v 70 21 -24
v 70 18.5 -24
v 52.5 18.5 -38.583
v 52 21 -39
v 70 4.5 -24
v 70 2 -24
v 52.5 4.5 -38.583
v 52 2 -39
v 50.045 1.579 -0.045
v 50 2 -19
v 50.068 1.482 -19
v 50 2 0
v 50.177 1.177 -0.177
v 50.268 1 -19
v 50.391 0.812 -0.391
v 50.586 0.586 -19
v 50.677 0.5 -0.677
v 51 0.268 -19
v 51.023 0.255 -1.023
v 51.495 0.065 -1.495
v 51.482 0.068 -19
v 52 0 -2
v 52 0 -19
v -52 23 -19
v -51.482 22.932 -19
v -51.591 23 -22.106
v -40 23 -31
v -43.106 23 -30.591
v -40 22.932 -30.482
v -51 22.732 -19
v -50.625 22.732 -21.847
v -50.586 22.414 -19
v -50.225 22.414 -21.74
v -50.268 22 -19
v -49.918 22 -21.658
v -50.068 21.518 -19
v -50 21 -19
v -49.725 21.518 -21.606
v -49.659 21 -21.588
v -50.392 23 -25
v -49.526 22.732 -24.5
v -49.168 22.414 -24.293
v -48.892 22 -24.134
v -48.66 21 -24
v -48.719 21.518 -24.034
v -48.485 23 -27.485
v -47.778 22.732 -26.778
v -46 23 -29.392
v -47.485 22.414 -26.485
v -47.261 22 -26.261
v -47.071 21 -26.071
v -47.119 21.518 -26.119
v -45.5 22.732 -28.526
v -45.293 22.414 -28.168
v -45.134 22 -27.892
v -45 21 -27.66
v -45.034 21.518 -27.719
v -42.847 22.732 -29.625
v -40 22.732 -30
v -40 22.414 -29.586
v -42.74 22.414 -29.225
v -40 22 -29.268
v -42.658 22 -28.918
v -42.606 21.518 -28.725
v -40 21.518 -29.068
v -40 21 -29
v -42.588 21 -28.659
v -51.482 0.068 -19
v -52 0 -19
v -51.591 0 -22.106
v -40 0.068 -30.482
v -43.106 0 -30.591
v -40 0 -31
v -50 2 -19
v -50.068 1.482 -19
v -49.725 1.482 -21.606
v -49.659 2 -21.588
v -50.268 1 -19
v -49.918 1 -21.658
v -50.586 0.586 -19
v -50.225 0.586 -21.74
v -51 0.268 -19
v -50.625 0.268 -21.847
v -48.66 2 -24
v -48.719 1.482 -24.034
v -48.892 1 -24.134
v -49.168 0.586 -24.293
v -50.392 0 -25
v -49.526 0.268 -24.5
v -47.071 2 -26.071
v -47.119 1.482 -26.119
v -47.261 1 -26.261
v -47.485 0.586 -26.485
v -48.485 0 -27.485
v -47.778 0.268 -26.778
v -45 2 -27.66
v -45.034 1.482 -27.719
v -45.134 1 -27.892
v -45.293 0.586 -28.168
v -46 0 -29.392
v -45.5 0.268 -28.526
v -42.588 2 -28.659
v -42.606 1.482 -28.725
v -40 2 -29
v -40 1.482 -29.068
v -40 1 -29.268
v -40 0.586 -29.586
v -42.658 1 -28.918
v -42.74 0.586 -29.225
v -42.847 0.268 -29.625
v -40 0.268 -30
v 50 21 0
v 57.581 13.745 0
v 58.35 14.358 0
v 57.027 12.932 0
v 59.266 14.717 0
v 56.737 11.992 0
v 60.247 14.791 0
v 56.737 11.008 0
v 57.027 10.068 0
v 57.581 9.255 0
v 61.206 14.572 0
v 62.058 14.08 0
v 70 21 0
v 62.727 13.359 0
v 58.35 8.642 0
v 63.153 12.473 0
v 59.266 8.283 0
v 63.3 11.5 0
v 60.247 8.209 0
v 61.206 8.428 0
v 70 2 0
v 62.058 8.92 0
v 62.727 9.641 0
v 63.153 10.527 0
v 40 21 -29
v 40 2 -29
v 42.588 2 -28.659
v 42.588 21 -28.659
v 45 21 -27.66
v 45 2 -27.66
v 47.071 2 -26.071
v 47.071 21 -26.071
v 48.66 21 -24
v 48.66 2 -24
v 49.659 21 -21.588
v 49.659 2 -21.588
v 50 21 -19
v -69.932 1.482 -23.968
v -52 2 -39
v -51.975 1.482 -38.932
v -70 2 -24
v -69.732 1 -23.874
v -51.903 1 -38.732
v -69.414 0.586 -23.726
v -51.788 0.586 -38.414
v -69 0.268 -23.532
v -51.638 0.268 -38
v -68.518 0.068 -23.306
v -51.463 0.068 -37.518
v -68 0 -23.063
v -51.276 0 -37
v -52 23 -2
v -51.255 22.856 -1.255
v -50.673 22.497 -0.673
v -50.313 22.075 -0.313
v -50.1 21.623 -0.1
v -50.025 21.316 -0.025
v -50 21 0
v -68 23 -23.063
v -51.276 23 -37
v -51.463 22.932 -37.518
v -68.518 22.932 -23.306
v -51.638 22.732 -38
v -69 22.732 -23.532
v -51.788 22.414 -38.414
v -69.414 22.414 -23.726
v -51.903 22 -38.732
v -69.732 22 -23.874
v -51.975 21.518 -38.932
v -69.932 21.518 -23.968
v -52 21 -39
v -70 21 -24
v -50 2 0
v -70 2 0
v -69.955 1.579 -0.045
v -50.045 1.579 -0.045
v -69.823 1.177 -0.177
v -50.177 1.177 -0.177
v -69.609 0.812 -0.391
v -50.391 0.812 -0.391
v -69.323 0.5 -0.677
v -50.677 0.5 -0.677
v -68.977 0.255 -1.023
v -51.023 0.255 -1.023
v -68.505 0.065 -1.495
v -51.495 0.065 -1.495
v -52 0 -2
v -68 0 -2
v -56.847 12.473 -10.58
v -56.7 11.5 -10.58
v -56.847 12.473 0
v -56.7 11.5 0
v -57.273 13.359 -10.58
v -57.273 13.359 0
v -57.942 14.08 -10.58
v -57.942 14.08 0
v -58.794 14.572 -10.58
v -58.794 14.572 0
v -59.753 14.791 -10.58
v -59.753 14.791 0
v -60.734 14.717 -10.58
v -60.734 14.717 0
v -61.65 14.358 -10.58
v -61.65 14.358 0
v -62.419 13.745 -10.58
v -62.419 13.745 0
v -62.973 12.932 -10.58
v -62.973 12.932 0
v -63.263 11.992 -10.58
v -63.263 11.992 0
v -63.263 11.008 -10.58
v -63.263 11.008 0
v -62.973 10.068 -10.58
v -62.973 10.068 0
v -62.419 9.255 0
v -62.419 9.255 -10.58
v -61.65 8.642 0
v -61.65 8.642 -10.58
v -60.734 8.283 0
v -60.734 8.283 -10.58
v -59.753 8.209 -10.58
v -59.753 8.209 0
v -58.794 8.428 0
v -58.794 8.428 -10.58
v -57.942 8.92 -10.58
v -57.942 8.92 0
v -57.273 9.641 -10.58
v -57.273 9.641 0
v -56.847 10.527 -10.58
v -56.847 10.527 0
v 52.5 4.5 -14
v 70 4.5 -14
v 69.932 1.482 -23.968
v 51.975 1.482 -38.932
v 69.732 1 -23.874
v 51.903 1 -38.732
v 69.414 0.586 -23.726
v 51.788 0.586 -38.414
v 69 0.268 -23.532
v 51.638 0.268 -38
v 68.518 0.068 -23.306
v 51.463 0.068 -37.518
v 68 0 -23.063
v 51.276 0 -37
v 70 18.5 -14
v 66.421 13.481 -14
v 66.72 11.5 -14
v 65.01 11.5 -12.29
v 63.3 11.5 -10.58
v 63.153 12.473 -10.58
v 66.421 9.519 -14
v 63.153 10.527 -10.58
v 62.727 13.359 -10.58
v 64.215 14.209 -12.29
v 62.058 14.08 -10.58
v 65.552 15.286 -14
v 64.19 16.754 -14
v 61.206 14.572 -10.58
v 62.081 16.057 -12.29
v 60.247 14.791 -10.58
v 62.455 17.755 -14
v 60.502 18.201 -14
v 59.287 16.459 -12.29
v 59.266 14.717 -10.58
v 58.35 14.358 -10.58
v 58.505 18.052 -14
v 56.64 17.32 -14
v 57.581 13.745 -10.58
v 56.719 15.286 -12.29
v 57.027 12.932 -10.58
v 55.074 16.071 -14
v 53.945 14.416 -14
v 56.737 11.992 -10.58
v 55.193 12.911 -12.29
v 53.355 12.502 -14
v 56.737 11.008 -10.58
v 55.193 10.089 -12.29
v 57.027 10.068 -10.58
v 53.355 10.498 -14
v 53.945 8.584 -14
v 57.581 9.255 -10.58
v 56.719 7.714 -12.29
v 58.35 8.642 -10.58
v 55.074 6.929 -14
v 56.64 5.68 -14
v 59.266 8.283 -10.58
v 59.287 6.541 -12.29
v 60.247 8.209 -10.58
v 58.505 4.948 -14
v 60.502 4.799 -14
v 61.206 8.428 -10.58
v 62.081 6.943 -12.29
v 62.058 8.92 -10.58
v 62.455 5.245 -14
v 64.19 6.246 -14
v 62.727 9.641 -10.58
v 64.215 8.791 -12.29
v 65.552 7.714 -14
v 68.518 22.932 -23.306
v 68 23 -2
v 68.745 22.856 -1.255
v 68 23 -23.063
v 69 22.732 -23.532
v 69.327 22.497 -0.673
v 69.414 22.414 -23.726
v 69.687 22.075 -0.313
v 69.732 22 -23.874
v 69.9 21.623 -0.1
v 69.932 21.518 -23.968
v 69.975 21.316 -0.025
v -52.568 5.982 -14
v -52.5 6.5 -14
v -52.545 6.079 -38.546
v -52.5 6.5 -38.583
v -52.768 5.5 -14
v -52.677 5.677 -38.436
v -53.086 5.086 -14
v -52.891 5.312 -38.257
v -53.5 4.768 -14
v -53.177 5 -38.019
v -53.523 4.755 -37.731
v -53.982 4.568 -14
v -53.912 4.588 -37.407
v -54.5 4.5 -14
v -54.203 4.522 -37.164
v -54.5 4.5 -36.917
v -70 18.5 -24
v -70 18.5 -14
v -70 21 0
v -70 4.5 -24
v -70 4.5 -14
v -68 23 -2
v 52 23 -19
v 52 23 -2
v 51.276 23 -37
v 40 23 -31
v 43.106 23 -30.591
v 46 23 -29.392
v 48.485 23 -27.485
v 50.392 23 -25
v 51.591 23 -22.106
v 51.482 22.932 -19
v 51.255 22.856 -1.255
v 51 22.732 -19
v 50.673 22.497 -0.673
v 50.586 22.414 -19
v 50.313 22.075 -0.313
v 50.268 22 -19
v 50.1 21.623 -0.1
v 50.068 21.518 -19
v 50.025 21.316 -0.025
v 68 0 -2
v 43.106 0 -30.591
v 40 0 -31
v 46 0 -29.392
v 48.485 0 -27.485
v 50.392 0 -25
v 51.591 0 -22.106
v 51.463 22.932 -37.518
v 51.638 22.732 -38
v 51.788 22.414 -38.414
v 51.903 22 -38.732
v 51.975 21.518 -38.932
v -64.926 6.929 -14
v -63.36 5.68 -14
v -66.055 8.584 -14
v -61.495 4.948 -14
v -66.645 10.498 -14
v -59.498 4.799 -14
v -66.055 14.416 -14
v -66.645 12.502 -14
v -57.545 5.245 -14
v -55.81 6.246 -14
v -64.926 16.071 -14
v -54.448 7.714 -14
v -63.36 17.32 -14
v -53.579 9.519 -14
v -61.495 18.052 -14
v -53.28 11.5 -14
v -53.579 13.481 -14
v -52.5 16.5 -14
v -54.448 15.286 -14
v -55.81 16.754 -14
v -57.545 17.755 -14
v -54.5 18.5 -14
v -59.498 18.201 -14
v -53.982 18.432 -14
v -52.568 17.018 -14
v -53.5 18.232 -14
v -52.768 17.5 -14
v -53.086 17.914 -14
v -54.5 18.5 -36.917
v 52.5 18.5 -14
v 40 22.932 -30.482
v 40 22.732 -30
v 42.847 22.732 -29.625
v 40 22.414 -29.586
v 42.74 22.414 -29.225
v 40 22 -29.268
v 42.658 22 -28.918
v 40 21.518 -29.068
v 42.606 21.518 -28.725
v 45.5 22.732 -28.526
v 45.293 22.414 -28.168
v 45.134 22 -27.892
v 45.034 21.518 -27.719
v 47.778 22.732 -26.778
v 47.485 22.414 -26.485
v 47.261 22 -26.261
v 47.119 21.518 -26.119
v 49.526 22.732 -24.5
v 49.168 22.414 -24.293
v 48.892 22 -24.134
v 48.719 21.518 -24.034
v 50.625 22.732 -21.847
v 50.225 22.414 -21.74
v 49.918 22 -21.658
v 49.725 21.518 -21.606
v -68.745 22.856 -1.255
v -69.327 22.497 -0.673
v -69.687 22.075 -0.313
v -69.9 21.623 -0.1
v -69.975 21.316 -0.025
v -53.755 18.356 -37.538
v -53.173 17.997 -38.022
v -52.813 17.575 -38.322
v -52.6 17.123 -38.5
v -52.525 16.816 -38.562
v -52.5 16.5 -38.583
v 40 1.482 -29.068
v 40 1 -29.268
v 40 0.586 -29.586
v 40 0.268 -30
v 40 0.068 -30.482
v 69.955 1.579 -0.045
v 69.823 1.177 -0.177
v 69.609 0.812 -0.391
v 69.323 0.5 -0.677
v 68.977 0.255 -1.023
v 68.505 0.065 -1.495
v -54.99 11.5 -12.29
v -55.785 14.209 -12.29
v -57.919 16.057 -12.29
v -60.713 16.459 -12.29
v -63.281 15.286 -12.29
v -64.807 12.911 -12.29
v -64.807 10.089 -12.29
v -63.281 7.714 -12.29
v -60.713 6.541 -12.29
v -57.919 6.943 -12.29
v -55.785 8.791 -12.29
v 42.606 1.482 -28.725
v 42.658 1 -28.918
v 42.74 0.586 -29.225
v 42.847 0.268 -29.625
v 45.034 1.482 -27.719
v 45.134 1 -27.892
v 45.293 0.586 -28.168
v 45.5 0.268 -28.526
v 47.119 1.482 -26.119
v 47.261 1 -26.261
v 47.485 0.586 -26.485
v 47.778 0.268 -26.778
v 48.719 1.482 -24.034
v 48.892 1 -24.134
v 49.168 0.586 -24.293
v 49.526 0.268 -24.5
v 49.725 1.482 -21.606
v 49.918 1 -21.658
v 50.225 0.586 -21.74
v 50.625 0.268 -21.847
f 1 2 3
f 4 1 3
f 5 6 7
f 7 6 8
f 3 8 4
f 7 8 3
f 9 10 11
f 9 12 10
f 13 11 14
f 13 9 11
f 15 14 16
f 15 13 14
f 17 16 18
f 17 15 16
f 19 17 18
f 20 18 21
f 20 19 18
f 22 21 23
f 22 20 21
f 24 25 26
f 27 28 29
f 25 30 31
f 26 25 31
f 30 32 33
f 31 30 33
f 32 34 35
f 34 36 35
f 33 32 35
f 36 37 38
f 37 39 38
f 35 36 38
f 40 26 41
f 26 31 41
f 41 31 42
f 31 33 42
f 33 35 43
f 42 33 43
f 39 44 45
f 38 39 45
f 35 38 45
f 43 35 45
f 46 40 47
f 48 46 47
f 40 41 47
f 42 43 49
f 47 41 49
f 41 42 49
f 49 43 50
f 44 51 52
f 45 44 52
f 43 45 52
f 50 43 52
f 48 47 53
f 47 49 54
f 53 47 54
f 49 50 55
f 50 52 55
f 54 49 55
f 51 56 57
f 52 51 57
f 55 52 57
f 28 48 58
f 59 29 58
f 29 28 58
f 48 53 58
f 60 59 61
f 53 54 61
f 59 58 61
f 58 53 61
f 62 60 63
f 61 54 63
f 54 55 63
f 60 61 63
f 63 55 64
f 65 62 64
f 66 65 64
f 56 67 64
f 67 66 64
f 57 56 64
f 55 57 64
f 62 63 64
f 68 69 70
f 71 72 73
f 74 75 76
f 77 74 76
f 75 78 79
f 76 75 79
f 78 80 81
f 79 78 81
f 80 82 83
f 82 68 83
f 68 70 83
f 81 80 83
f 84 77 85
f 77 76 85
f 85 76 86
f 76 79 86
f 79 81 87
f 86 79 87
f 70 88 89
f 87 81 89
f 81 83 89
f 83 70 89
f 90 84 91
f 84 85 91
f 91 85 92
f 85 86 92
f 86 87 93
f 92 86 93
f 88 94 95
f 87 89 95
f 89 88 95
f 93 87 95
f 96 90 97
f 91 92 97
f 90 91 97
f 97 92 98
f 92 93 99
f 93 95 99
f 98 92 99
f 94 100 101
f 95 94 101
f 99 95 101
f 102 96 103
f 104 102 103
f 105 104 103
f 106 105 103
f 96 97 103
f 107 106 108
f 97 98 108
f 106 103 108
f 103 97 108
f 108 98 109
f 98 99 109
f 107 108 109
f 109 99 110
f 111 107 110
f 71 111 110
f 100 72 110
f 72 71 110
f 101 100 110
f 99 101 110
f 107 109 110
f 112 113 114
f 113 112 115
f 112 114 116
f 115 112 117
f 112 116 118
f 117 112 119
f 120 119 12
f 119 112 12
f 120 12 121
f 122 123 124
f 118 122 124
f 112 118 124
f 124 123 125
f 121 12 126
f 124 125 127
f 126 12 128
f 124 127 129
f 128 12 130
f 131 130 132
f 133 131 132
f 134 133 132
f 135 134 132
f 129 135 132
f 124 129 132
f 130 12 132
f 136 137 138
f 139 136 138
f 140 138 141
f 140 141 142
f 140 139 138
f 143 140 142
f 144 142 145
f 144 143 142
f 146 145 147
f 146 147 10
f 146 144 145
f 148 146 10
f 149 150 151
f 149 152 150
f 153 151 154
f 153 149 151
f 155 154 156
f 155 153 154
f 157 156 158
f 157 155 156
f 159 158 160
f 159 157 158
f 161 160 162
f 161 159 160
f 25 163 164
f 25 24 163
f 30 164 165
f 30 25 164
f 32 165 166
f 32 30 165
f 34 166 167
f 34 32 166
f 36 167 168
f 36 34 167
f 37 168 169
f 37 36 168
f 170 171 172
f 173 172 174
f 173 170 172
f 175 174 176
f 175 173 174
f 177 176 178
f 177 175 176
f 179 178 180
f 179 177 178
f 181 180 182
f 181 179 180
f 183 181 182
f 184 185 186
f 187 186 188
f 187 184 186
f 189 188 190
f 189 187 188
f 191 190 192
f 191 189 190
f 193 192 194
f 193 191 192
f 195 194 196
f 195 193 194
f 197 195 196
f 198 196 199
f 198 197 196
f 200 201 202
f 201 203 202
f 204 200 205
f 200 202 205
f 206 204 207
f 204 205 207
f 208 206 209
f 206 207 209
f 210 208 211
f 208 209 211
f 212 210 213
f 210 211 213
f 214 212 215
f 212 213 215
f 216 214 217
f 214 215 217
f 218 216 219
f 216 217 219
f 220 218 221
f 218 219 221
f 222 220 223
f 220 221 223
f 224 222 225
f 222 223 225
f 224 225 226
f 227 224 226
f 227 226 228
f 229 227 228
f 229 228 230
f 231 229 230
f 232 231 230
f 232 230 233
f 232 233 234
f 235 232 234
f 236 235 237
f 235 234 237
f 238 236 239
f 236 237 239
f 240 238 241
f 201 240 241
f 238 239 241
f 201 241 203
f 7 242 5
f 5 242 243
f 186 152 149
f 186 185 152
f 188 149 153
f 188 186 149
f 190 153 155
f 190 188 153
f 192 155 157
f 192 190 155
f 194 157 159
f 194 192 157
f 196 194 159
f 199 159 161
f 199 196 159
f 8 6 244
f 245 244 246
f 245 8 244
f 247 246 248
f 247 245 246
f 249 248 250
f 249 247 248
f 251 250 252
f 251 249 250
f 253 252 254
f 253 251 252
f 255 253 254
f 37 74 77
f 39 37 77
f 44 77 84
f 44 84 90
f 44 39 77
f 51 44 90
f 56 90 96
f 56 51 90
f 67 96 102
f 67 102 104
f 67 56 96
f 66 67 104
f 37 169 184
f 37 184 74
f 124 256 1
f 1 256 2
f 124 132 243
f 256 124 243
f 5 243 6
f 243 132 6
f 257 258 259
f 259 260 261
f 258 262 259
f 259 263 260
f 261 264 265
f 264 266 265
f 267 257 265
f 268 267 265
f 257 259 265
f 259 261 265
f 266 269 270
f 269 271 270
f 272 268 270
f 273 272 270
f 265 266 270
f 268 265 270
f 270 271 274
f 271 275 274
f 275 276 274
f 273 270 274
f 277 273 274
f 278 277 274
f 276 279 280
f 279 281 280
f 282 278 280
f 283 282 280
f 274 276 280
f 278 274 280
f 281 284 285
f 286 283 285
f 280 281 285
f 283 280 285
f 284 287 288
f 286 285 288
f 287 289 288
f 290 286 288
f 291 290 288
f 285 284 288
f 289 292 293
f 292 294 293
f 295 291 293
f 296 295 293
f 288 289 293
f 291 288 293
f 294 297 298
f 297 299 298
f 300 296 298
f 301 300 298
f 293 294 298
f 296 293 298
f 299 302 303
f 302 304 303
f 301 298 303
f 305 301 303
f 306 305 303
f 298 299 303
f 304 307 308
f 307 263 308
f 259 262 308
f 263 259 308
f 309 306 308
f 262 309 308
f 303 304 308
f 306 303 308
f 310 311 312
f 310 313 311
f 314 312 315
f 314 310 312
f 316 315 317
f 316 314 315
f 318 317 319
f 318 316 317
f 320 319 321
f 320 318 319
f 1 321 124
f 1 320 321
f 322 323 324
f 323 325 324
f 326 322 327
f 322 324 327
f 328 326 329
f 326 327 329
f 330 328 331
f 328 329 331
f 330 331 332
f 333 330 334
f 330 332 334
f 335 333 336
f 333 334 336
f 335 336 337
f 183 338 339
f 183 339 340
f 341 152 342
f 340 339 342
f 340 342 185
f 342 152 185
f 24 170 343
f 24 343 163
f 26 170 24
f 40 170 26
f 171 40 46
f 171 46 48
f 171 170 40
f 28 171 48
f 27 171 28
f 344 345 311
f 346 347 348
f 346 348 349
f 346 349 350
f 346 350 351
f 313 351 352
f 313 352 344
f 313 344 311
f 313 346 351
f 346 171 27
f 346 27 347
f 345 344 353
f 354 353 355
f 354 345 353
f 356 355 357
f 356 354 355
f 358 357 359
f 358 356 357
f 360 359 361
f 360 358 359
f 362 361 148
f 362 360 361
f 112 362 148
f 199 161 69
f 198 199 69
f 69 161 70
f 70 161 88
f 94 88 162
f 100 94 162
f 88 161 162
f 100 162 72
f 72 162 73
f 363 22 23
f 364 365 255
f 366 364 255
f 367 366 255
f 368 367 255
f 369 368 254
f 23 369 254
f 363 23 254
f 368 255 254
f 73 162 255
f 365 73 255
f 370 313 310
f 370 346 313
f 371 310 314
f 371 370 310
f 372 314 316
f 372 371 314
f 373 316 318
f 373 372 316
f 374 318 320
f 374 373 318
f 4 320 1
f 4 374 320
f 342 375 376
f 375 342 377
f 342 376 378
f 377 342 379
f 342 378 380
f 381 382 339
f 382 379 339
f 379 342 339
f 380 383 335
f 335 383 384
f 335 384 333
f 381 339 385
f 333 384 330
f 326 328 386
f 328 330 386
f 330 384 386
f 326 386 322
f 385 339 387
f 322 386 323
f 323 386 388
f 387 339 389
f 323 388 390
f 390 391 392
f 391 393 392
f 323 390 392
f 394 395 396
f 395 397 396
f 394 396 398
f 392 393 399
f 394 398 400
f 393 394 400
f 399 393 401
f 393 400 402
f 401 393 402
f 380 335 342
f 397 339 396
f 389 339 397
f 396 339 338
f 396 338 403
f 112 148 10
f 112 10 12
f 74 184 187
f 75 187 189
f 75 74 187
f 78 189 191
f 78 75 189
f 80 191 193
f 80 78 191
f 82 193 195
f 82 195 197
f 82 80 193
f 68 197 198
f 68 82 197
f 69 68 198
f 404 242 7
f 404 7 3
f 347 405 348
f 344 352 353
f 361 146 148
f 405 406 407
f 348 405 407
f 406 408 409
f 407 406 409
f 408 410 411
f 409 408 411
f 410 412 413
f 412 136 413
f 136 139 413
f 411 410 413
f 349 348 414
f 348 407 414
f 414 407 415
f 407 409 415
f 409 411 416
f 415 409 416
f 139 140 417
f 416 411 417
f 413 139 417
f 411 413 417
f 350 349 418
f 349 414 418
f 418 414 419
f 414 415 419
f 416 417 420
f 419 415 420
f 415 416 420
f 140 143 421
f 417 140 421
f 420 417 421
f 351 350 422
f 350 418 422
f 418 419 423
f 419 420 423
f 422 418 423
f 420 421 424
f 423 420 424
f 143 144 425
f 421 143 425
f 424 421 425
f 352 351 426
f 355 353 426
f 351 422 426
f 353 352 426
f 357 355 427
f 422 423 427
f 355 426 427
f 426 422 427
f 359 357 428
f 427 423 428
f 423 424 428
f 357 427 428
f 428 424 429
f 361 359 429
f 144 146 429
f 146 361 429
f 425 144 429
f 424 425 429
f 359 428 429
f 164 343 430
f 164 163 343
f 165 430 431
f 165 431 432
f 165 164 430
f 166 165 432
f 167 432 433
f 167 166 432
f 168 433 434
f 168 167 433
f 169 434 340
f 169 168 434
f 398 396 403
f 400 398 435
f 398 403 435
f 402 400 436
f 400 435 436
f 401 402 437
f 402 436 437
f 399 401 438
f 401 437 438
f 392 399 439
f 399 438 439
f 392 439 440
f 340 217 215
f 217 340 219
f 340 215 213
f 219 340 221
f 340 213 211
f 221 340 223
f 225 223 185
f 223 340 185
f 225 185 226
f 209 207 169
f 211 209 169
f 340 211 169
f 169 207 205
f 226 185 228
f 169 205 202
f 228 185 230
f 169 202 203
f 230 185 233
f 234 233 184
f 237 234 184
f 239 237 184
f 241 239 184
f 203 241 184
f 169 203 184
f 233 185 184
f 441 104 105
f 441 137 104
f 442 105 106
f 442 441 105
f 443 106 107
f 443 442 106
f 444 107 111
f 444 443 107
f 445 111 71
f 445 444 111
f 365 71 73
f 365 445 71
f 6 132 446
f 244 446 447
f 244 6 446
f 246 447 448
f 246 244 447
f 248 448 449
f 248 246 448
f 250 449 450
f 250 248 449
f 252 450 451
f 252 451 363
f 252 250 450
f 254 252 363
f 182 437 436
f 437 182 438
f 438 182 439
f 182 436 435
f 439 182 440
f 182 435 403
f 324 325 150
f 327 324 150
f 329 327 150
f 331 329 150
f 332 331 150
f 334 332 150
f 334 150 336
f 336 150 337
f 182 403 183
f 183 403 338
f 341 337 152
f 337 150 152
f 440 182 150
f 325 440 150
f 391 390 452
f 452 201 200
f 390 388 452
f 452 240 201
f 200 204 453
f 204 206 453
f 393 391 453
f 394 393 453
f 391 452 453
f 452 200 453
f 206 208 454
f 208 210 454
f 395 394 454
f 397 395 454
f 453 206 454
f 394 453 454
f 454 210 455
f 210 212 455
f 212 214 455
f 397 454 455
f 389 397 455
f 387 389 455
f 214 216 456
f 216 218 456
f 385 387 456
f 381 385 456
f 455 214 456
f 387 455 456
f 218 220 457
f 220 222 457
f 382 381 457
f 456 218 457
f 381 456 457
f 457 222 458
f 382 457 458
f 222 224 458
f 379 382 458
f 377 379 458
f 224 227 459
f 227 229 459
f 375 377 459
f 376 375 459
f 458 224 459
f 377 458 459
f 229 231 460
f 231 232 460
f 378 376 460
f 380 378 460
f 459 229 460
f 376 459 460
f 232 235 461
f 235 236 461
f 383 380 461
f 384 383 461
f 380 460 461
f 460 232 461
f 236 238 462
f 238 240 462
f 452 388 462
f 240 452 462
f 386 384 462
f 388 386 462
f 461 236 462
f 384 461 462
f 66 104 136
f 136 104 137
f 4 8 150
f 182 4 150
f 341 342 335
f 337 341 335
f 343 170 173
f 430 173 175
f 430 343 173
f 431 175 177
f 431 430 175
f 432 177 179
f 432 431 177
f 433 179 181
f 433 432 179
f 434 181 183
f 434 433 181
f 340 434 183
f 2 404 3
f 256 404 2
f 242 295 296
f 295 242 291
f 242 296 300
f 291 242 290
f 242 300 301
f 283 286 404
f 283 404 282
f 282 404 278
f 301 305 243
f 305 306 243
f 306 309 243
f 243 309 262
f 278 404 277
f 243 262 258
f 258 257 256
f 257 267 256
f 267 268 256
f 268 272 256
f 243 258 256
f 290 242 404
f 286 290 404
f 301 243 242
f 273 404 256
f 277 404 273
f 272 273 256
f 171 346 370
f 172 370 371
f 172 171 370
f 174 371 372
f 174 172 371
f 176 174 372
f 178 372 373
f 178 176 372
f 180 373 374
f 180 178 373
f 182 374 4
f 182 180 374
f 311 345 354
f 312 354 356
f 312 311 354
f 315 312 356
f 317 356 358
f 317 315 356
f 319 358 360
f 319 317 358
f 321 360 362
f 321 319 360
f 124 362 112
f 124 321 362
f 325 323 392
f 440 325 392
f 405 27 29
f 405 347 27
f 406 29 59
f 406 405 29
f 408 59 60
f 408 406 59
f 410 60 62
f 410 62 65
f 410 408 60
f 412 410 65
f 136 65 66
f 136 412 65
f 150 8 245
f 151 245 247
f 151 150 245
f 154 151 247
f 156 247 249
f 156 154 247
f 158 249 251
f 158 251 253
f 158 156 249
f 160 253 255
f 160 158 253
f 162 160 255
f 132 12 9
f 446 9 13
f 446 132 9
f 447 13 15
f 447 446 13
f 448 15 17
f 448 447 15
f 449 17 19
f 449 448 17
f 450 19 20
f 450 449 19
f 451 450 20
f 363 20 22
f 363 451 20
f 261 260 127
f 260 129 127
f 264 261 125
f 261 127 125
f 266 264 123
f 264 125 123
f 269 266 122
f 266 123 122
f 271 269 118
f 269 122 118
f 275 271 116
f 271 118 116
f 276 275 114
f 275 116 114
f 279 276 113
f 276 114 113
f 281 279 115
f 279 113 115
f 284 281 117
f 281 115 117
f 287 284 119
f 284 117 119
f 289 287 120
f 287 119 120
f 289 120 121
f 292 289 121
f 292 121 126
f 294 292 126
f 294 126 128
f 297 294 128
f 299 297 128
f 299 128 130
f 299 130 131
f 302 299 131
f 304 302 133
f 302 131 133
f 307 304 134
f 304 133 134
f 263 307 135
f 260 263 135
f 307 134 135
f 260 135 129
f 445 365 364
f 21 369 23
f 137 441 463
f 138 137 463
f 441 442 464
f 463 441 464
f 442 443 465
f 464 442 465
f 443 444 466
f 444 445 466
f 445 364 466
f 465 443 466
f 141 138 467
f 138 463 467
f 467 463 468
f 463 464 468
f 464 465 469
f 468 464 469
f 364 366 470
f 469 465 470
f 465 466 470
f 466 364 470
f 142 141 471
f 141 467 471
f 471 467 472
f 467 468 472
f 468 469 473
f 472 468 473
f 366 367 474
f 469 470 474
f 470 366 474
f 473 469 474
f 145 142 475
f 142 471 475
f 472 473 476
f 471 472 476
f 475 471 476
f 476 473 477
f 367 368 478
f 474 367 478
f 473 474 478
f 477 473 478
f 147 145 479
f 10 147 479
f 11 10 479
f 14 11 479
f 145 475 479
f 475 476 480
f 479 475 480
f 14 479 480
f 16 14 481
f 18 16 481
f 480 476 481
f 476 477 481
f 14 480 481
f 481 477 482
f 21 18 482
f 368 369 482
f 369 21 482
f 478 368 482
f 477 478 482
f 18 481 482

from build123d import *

# Parameters (mm, degrees)
EXTRUDE_1_DEPTH              = 23
CUT_EXTRUDE_1_DEPTH          = 84.366660003
CUT_EXTRUDE_1_DEPTH_BACK     = 84.366660003
SKETCH_2_R                   = 3.25
CUT_EXTRUDE_START            = -14
SKETCH_3_W                   = 32.603490834
SKETCH_3_H                   = 14
CUT_EXTRUDE_2_DEPTH          = 70.366660003
FILLET_1_R                   = 10
HOLE_WIZARD_M6_1_D           = 6.6
HOLE_WIZARD_M6_1_CSINK_D     = 13.44
HOLE_WIZARD_M6_1_CSINK_ANGLE = 90
FILLET_2_R                   = 2


with BuildPart() as part:
    # 草图1 → 凸台-拉伸1 (new body)
    with BuildSketch(Plane(origin=(0, 0, 0), x_dir=(1, 0, 0), z_dir=(0, 1, 0))):
        Polygon((-50, 0), (-50, 29), (50, 29), (50, 0), (70, 0), (70, 24), (52, 39), (-52, 39), (-70, 24), (-70, 0), align=None)
    extrude(amount=EXTRUDE_1_DEPTH)

    # 草图2 → 切除-拉伸1 (cut, two sides: drawn at the far end of the back side and taken through both)
    with BuildSketch(Plane.XY.offset(-CUT_EXTRUDE_1_DEPTH_BACK)):
        with Locations(Location((-60, 11.5, 0), (0, 0, 180))):
            Circle(SKETCH_2_R)
        with Locations((60, 11.5)):
            Circle(SKETCH_2_R)
    extrude(amount=CUT_EXTRUDE_1_DEPTH + CUT_EXTRUDE_1_DEPTH_BACK, mode=Mode.SUBTRACT)

    # 草图3 → 切除-拉伸2 (cut, through all)
    with BuildSketch(Plane.XY.offset(CUT_EXTRUDE_START)):
        with Locations((68.801745417, 11.5)):
            Rectangle(SKETCH_3_W, SKETCH_3_H)
        with Locations((-68.801745417, 11.5)):
            Rectangle(SKETCH_3_W, SKETCH_3_H)
    extrude(amount=-CUT_EXTRUDE_2_DEPTH, mode=Mode.SUBTRACT)

    # 圆角1
    fillet_1_edges = [part.edges().sort_by_distance(p)[0] for p in [
        (50, 11.5, -29),
        (-50, 11.5, -29),
    ]]
    fillet(fillet_1_edges, radius=FILLET_1_R)

    # M6 六角凹锥坑螺钉的锥形沉头孔1 (through all)
    with Locations(Plane(origin=(60, 11.5, -14), x_dir=(-1, 0, 0), z_dir=(0, 0, -1))):
        with Locations((0, 0), (120, 0)):
            CounterSinkHole(HOLE_WIZARD_M6_1_D / 2, HOLE_WIZARD_M6_1_CSINK_D / 2, counter_sink_angle=HOLE_WIZARD_M6_1_CSINK_ANGLE)

    # 圆角2
    fillet_2_edges = [part.edges().sort_by_distance(p)[0] for p in [
        (-70, 0, -12),
        (-61, 0, -31.5),
        (0, 0, -39),
        (61, 0, -31.5),
        (70, 0, -12),
        (60, 0, 0),
        (-50, 0, -9.5),
        (-60, 0, 0),
        (60, 23, 0),
        (70, 23, -12),
        (61, 23, -31.5),
        (0, 23, -39),
        (-61, 23, -31.5),
        (-70, 23, -12),
        (-60, 23, 0),
        (-52.5, 18.5, -26.291666667),
        (-52.5, 4.5, -26.291666667),
        (50, 0, -9.5),
        (50, 23, -9.5),
        (0, 0, -29),
        (0, 23, -29),
        (47.071067812, 0, -26.071067812),
        (47.071067812, 23, -26.071067812),
        (-47.071067812, 0, -26.071067812),
        (-50, 23, -9.5),
        (-47.071067812, 23, -26.071067812),
    ]]
    fillet(fillet_2_edges, radius=FILLET_2_R)


solid = part.part
